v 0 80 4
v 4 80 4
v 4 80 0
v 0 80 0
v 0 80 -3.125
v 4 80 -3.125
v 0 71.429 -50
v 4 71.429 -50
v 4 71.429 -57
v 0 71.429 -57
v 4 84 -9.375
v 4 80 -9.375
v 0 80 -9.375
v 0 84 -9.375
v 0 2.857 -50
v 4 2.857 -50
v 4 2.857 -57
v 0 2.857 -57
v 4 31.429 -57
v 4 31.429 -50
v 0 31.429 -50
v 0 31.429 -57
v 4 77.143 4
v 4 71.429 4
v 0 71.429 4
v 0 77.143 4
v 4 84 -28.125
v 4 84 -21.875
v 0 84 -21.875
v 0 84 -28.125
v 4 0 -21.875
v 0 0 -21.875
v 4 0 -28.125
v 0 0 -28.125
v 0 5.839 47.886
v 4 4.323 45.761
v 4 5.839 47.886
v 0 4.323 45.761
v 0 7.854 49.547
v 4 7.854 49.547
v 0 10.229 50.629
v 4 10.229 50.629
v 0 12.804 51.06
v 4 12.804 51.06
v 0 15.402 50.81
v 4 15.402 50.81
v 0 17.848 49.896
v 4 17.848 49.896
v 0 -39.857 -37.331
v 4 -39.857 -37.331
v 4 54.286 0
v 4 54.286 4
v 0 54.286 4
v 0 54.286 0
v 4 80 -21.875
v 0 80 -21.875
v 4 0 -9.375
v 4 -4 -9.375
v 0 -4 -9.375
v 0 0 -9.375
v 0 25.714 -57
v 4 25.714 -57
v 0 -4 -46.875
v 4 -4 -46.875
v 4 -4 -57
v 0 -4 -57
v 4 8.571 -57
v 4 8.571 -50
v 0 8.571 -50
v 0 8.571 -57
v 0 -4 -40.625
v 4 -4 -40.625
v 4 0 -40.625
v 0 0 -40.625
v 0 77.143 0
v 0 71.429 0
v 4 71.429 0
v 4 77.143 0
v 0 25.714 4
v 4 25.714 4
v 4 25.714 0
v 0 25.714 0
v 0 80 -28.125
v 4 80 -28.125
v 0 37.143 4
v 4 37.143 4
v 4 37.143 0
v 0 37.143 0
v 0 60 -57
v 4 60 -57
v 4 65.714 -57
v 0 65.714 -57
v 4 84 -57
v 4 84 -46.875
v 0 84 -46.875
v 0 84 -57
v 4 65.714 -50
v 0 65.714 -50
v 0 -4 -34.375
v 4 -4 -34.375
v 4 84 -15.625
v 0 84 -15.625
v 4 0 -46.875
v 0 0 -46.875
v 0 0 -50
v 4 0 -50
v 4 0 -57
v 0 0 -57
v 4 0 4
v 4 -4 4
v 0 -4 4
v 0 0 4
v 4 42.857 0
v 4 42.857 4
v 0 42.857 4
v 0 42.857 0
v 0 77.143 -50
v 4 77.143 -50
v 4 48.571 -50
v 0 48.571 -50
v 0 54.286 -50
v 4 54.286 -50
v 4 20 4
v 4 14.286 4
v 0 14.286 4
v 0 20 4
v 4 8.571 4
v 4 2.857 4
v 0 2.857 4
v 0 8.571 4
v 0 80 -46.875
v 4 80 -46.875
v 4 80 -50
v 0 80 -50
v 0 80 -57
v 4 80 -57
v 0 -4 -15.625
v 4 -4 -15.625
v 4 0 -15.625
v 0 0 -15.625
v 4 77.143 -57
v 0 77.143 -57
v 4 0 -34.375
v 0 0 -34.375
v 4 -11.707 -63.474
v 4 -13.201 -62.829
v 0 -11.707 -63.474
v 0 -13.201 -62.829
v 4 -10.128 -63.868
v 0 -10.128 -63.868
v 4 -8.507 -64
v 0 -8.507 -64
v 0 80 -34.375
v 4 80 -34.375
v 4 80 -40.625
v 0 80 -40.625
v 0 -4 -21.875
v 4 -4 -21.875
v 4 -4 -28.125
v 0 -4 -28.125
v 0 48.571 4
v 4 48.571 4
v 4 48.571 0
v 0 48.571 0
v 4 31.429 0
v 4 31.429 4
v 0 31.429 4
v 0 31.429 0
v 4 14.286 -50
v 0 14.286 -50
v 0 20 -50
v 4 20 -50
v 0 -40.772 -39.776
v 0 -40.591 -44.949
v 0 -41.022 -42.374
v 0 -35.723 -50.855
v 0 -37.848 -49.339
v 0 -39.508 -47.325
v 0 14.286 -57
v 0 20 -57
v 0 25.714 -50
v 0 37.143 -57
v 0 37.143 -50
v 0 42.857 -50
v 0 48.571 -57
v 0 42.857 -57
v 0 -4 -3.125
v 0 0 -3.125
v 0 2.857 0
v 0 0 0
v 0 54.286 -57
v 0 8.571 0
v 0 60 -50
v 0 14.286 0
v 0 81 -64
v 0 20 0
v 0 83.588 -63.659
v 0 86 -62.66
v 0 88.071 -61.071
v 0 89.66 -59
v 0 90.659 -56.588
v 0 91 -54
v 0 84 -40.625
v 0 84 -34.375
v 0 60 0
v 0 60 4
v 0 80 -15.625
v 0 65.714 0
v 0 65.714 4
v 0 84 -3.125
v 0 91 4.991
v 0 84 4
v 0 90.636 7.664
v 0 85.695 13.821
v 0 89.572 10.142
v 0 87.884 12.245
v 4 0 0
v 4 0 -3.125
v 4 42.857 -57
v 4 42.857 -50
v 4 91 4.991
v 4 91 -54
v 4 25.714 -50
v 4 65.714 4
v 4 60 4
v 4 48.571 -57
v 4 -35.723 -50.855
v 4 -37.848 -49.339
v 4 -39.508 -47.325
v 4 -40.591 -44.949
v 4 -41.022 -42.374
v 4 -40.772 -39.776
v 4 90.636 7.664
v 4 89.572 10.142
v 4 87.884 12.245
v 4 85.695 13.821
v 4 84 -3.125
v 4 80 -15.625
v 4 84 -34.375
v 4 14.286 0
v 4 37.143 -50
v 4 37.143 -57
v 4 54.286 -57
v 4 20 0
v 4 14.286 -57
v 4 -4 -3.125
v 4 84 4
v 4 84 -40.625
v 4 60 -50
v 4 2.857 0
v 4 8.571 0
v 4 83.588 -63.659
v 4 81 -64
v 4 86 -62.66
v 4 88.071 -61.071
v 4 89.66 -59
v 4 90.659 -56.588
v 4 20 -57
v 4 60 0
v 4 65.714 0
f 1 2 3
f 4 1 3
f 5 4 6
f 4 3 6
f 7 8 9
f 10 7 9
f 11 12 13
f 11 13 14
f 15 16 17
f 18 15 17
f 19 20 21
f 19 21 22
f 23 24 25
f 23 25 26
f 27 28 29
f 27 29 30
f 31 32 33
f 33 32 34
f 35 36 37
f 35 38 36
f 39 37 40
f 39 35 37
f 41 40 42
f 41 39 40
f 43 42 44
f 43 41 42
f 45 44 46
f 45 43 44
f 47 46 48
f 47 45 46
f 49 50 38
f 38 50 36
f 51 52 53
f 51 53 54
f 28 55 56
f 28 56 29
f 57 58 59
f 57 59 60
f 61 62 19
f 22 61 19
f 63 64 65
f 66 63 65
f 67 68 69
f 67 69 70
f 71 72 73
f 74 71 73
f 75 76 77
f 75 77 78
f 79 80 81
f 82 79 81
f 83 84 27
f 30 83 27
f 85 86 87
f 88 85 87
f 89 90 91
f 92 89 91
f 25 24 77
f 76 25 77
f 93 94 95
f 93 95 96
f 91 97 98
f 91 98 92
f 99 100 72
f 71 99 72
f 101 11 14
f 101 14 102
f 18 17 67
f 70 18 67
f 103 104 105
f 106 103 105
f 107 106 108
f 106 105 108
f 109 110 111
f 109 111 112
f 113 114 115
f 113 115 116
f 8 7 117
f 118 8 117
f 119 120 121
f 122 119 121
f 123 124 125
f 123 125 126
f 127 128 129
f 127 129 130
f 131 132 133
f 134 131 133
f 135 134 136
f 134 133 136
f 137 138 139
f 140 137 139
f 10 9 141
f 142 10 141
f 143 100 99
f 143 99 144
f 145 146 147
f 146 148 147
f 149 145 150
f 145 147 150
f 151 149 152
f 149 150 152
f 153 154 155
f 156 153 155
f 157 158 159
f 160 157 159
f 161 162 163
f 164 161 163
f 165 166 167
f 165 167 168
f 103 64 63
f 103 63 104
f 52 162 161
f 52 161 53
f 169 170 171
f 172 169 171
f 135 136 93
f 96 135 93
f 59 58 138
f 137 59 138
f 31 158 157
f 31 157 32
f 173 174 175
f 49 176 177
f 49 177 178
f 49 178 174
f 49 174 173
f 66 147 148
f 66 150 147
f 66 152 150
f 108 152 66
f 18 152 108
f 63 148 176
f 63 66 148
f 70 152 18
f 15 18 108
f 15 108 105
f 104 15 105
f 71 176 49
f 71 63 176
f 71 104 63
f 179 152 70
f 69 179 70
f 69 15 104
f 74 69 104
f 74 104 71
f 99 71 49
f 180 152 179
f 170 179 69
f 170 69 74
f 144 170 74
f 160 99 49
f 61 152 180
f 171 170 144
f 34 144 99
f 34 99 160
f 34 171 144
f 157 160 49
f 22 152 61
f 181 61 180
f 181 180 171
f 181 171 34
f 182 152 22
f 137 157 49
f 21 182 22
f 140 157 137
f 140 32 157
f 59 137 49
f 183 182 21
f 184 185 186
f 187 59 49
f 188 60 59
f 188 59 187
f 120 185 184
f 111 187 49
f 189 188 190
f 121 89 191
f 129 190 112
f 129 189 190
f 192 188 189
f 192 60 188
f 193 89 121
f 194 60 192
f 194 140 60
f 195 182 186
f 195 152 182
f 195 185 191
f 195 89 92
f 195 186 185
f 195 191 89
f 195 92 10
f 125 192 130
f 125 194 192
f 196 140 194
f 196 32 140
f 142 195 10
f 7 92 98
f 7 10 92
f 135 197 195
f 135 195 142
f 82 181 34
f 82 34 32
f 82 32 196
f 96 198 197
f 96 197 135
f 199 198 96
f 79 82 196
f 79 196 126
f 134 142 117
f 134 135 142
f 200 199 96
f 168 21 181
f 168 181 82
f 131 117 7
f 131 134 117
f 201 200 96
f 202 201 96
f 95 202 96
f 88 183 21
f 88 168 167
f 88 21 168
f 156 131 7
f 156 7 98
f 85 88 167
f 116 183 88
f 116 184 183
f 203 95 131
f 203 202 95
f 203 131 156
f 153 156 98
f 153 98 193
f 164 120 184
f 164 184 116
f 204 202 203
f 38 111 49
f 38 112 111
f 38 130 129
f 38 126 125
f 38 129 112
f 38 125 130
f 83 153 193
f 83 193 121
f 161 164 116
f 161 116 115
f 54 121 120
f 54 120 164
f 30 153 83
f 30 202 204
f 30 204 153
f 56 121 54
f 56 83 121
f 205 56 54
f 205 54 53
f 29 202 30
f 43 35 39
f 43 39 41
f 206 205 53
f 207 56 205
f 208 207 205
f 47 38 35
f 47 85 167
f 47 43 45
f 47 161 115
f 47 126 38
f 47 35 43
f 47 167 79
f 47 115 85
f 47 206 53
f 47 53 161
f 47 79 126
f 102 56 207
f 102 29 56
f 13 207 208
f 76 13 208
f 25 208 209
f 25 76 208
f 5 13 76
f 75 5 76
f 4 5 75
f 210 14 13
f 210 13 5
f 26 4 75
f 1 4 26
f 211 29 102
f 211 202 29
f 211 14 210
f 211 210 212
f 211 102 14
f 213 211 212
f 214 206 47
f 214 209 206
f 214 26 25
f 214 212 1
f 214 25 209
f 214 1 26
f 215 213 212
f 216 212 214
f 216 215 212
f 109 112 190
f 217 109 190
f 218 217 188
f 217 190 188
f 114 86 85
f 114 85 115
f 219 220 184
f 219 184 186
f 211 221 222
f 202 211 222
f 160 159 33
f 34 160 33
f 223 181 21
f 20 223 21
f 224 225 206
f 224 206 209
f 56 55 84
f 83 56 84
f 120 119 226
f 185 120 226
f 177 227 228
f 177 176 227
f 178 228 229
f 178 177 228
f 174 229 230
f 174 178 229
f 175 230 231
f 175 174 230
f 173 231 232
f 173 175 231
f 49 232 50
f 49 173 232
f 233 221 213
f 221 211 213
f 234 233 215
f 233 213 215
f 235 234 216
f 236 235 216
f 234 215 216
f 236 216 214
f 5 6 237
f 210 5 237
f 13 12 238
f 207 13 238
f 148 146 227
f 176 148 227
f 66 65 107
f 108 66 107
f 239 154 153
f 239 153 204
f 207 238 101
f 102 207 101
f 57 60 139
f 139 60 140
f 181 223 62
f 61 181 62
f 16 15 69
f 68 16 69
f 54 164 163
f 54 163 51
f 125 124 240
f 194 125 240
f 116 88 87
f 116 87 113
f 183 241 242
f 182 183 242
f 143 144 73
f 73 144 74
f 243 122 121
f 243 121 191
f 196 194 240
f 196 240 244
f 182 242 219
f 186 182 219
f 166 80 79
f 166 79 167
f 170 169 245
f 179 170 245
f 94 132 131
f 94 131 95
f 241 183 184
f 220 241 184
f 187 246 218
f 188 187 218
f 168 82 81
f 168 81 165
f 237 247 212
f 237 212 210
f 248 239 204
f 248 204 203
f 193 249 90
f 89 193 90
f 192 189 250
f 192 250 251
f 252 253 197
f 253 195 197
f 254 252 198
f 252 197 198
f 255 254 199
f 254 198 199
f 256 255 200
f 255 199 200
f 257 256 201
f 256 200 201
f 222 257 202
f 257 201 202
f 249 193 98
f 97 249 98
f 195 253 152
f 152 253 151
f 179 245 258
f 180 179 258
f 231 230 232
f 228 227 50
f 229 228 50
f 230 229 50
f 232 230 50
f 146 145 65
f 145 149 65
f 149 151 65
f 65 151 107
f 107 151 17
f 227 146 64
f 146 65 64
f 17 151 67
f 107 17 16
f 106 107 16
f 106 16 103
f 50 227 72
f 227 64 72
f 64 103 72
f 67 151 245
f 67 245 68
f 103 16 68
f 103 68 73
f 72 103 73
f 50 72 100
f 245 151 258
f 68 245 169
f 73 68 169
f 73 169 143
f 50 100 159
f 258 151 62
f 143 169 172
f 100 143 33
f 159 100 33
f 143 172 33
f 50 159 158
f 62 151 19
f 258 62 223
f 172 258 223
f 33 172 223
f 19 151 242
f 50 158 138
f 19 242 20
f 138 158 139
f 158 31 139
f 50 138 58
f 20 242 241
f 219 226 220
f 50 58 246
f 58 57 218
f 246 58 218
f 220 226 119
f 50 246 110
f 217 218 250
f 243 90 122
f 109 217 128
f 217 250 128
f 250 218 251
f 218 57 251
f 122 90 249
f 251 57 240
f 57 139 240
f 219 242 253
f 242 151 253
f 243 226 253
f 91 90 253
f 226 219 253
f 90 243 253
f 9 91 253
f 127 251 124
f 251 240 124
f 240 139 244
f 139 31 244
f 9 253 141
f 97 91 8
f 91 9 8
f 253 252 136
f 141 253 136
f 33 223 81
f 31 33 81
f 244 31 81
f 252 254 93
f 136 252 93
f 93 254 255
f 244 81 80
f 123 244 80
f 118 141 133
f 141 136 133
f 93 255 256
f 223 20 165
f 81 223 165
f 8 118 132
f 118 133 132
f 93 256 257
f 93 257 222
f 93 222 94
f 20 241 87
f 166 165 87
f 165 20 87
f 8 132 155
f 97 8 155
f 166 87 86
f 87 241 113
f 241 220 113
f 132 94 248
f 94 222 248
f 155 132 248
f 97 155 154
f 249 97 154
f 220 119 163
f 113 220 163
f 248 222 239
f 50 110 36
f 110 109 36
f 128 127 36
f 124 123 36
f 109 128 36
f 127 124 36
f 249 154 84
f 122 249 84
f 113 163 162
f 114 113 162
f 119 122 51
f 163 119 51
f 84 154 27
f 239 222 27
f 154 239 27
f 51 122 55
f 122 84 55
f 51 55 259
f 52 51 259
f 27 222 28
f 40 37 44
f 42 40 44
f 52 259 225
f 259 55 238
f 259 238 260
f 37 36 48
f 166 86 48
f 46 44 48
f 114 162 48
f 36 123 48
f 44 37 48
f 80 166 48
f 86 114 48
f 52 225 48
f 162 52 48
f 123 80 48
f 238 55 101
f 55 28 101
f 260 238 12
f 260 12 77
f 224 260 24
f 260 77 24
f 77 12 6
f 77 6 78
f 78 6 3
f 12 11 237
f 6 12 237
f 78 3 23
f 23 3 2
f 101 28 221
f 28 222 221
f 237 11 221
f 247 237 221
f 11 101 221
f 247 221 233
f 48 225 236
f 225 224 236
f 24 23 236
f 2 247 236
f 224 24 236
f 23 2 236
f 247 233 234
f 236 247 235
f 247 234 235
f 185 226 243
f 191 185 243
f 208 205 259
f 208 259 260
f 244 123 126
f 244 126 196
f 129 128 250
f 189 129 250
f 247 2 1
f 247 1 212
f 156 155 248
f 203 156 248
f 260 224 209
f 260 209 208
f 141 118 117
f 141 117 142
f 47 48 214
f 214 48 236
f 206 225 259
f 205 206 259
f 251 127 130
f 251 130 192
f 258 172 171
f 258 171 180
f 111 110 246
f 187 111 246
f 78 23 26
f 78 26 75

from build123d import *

# Parameters (mm, degrees)
SCHIZZO1_W                   = 50
SCHIZZO1_H                   = 80
ESTRUSIONE_ESTRUSIONE1_DEPTH = 4
SCHIZZO2_W                   = 4
SCHIZZO2_H                   = 2.857142857
SCHIZZO2_W_2                 = 7
ESTRUSIONE_ESTRUSIONE2_DEPTH = 4
SCHIZZO3_W                   = 4
SCHIZZO3_H                   = 5.714285715
SCHIZZO3_W_2                 = 7
ESTRUSIONE_ESTRUSIONE3_DEPTH = 4
RIPETIZIONE_A_L1_COUNT       = 6
RIPETIZIONE_A_L1_PITCH       = 11.428571
SCHIZZO4_W                   = 6.25
SCHIZZO4_H                   = 4
ESTRUSIONE_ESTRUSIONE4_DEPTH = 4
RIPETIZIONE_A_L2_COUNT       = 4
RIPETIZIONE_A_L2_PITCH       = 12.5
SCHIZZO5_W                   = 61
SCHIZZO5_H                   = 88
ESTRUSIONE_ESTRUSIONE5_DEPTH = 4
RACCORDO1_R                  = 10
RACCORDO2_R                  = 10


with BuildPart() as part:
    # Schizzo1 → Estrusione-Estrusione1 (new body)
    with BuildSketch(Plane(origin=(0, 0, 0), x_dir=(0, 0, -1), z_dir=(1, 0, 0))):
        with Locations((25, 40)):
            Rectangle(SCHIZZO1_W, SCHIZZO1_H)
    extrude(amount=ESTRUSIONE_ESTRUSIONE1_DEPTH)

    # Schizzo2 → Estrusione-Estrusione2 (add)
    with BuildSketch(Plane(origin=(4, 0, 0), x_dir=(0, 0, -1), z_dir=(1, 0, 0))):
        with Locations((-2, 78.571428572)):
            Rectangle(SCHIZZO2_W, SCHIZZO2_H)
        with Locations((53.5, 78.571428572)):
            Rectangle(SCHIZZO2_W_2, SCHIZZO2_H)
        with Locations((53.5, 1.428571429)):
            Rectangle(SCHIZZO2_W_2, SCHIZZO2_H)
        with Locations((-2, 1.428571429)):
            Rectangle(SCHIZZO2_W, SCHIZZO2_H)
    extrude(amount=-ESTRUSIONE_ESTRUSIONE2_DEPTH)

    # Schizzo3 → Estrusione-Estrusione3 (add)
    with BuildSketch(Plane(origin=(4, 0, 0), x_dir=(0, 0, -1), z_dir=(1, 0, 0))):
        with Locations((-2, 68.571428572)):
            Rectangle(SCHIZZO3_W, SCHIZZO3_H)
        with Locations((53.5, 68.571428572)):
            Rectangle(SCHIZZO3_W_2, SCHIZZO3_H)
    estrusione_estrusione3 = extrude(amount=-ESTRUSIONE_ESTRUSIONE3_DEPTH)

    # Ripetizione a L1: Estrusione-Estrusione3 ×6
    with Locations(*[(0, -i * RIPETIZIONE_A_L1_PITCH, 0) for i in range(1, RIPETIZIONE_A_L1_COUNT)]):
        add(estrusione_estrusione3)

    # Schizzo4 → Estrusione-Estrusione4 (add)
    with BuildSketch(Plane(origin=(4, 0, 0), x_dir=(0, 0, -1), z_dir=(1, 0, 0))):
        with Locations((6.25, 82)):
            Rectangle(SCHIZZO4_W, SCHIZZO4_H)
        with Locations((6.25, -2)):
            Rectangle(SCHIZZO4_W, SCHIZZO4_H)
    estrusione_estrusione4 = extrude(amount=-ESTRUSIONE_ESTRUSIONE4_DEPTH)

    # Ripetizione a L2: Estrusione-Estrusione4 ×4
    with Locations(*[(0, 0, -i * RIPETIZIONE_A_L2_PITCH) for i in range(1, RIPETIZIONE_A_L2_COUNT)]):
        add(estrusione_estrusione4)

    # Schizzo5 → Estrusione-Estrusione5 (add)
    with BuildSketch(Plane(origin=(4, 0, 0), x_dir=(0, 0, -1), z_dir=(1, 0, 0))):
        Polygon((64, -11), (46.160080614, -44.552008529), (-54.590569466, 9.018062365), (-11, 91), (64, 91), align=None)
        with Locations((26.5, 40)):
            Rectangle(SCHIZZO5_W, SCHIZZO5_H, mode=Mode.SUBTRACT)
    extrude(amount=-ESTRUSIONE_ESTRUSIONE5_DEPTH)

    # Raccordo1
    raccordo1_edges = [part.edges().sort_by_distance(p)[0] for p in [
        (2, -44.552008529, -46.160080614),
        (2, 9.018062365, 54.590569466),
    ]]
    fillet(raccordo1_edges, radius=RACCORDO1_R)

    # Raccordo2
    raccordo2_edges = [part.edges().sort_by_distance(p)[0] for p in [
        (2, 91, -64),
        (2, -11, -64),
        (2, 91, 11),
    ]]
    fillet(raccordo2_edges, radius=RACCORDO2_R)


solid = part.part
